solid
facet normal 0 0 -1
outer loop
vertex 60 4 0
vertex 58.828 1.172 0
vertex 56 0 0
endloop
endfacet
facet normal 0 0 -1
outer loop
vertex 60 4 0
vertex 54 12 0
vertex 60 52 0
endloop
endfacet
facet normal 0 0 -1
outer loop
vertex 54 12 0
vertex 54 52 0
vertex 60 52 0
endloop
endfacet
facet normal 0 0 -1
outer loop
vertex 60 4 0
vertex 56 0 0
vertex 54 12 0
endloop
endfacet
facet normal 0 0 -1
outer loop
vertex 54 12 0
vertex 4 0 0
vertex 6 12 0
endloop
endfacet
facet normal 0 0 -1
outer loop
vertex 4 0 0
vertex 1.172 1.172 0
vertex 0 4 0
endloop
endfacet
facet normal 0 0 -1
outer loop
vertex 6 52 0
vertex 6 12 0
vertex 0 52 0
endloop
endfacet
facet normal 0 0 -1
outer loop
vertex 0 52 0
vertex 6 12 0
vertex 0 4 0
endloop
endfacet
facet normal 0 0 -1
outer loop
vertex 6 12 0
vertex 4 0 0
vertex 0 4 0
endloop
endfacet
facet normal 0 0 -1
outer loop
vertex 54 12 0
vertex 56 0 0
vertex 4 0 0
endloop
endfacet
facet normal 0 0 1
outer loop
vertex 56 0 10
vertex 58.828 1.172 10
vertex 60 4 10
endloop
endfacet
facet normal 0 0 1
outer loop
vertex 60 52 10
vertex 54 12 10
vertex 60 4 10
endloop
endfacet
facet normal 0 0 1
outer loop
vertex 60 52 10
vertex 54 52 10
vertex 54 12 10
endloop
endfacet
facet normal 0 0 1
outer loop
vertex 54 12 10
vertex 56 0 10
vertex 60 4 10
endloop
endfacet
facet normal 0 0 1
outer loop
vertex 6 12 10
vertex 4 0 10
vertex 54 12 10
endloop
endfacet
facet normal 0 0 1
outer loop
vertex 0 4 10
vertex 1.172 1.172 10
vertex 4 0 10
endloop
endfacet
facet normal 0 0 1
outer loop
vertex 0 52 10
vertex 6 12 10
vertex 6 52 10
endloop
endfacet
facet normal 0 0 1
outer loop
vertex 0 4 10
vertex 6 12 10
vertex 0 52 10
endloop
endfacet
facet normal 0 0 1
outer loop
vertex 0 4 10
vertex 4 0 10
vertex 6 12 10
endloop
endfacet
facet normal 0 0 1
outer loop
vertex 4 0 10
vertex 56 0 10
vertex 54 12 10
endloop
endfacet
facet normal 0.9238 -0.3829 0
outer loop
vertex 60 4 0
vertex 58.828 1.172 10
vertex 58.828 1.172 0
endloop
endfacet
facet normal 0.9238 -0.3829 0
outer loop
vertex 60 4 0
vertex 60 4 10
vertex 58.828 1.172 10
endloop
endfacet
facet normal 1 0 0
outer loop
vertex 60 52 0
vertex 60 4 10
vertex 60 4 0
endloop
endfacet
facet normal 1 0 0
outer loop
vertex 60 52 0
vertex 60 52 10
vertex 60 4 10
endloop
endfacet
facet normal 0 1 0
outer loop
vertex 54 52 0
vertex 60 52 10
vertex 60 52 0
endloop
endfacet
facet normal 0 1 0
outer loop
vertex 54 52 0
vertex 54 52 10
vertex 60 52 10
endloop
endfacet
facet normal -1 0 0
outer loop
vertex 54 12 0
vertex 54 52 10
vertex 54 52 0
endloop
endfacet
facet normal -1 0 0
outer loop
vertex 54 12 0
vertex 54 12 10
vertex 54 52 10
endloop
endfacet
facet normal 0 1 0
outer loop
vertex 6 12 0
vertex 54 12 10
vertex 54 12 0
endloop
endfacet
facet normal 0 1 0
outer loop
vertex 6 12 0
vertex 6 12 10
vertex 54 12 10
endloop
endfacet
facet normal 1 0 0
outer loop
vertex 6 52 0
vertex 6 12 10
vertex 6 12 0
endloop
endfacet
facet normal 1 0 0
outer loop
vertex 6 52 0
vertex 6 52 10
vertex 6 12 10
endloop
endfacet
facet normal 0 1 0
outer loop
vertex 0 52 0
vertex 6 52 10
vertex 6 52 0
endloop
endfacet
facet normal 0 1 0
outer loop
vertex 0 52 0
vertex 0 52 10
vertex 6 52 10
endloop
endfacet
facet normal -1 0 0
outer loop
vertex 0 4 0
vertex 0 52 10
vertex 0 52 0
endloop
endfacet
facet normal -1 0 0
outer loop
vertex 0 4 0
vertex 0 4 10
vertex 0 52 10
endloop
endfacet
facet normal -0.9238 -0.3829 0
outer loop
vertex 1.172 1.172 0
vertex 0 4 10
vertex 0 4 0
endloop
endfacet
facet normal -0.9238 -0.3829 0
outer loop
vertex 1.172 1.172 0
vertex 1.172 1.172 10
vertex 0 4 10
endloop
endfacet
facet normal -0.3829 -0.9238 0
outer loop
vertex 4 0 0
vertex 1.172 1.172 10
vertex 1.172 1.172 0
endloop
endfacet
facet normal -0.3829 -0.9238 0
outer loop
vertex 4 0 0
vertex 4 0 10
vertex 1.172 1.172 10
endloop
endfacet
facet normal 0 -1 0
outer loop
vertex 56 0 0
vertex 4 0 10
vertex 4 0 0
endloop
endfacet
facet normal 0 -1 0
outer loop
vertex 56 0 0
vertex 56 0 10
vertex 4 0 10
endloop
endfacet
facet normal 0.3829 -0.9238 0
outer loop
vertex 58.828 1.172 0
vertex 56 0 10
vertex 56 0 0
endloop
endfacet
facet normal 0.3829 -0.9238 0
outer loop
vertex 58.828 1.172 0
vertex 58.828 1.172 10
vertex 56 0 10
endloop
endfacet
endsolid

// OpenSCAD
$fn = 32;

// ----------------------------------------------------------------------
// Heat sink frame: 60 x 52 mm frame, 6 mm walls
// ----------------------------------------------------------------------

// --- parameters (mm) ---
profile_height = 10;      // extrusion height
profile_points = 12;      // points of the closed outline

profile = [[0, 4], [1.172, 1.172], [4, 0], [56, 0], [58.828, 1.172], [60, 4], [60, 52], [54, 52], [54, 12], [6, 12], [6, 52], [0, 52]];  // single closed polygon, 12 points, counter clockwise

// --- the one profile operation ---
linear_extrude(height = profile_height) polygon(points = profile);
